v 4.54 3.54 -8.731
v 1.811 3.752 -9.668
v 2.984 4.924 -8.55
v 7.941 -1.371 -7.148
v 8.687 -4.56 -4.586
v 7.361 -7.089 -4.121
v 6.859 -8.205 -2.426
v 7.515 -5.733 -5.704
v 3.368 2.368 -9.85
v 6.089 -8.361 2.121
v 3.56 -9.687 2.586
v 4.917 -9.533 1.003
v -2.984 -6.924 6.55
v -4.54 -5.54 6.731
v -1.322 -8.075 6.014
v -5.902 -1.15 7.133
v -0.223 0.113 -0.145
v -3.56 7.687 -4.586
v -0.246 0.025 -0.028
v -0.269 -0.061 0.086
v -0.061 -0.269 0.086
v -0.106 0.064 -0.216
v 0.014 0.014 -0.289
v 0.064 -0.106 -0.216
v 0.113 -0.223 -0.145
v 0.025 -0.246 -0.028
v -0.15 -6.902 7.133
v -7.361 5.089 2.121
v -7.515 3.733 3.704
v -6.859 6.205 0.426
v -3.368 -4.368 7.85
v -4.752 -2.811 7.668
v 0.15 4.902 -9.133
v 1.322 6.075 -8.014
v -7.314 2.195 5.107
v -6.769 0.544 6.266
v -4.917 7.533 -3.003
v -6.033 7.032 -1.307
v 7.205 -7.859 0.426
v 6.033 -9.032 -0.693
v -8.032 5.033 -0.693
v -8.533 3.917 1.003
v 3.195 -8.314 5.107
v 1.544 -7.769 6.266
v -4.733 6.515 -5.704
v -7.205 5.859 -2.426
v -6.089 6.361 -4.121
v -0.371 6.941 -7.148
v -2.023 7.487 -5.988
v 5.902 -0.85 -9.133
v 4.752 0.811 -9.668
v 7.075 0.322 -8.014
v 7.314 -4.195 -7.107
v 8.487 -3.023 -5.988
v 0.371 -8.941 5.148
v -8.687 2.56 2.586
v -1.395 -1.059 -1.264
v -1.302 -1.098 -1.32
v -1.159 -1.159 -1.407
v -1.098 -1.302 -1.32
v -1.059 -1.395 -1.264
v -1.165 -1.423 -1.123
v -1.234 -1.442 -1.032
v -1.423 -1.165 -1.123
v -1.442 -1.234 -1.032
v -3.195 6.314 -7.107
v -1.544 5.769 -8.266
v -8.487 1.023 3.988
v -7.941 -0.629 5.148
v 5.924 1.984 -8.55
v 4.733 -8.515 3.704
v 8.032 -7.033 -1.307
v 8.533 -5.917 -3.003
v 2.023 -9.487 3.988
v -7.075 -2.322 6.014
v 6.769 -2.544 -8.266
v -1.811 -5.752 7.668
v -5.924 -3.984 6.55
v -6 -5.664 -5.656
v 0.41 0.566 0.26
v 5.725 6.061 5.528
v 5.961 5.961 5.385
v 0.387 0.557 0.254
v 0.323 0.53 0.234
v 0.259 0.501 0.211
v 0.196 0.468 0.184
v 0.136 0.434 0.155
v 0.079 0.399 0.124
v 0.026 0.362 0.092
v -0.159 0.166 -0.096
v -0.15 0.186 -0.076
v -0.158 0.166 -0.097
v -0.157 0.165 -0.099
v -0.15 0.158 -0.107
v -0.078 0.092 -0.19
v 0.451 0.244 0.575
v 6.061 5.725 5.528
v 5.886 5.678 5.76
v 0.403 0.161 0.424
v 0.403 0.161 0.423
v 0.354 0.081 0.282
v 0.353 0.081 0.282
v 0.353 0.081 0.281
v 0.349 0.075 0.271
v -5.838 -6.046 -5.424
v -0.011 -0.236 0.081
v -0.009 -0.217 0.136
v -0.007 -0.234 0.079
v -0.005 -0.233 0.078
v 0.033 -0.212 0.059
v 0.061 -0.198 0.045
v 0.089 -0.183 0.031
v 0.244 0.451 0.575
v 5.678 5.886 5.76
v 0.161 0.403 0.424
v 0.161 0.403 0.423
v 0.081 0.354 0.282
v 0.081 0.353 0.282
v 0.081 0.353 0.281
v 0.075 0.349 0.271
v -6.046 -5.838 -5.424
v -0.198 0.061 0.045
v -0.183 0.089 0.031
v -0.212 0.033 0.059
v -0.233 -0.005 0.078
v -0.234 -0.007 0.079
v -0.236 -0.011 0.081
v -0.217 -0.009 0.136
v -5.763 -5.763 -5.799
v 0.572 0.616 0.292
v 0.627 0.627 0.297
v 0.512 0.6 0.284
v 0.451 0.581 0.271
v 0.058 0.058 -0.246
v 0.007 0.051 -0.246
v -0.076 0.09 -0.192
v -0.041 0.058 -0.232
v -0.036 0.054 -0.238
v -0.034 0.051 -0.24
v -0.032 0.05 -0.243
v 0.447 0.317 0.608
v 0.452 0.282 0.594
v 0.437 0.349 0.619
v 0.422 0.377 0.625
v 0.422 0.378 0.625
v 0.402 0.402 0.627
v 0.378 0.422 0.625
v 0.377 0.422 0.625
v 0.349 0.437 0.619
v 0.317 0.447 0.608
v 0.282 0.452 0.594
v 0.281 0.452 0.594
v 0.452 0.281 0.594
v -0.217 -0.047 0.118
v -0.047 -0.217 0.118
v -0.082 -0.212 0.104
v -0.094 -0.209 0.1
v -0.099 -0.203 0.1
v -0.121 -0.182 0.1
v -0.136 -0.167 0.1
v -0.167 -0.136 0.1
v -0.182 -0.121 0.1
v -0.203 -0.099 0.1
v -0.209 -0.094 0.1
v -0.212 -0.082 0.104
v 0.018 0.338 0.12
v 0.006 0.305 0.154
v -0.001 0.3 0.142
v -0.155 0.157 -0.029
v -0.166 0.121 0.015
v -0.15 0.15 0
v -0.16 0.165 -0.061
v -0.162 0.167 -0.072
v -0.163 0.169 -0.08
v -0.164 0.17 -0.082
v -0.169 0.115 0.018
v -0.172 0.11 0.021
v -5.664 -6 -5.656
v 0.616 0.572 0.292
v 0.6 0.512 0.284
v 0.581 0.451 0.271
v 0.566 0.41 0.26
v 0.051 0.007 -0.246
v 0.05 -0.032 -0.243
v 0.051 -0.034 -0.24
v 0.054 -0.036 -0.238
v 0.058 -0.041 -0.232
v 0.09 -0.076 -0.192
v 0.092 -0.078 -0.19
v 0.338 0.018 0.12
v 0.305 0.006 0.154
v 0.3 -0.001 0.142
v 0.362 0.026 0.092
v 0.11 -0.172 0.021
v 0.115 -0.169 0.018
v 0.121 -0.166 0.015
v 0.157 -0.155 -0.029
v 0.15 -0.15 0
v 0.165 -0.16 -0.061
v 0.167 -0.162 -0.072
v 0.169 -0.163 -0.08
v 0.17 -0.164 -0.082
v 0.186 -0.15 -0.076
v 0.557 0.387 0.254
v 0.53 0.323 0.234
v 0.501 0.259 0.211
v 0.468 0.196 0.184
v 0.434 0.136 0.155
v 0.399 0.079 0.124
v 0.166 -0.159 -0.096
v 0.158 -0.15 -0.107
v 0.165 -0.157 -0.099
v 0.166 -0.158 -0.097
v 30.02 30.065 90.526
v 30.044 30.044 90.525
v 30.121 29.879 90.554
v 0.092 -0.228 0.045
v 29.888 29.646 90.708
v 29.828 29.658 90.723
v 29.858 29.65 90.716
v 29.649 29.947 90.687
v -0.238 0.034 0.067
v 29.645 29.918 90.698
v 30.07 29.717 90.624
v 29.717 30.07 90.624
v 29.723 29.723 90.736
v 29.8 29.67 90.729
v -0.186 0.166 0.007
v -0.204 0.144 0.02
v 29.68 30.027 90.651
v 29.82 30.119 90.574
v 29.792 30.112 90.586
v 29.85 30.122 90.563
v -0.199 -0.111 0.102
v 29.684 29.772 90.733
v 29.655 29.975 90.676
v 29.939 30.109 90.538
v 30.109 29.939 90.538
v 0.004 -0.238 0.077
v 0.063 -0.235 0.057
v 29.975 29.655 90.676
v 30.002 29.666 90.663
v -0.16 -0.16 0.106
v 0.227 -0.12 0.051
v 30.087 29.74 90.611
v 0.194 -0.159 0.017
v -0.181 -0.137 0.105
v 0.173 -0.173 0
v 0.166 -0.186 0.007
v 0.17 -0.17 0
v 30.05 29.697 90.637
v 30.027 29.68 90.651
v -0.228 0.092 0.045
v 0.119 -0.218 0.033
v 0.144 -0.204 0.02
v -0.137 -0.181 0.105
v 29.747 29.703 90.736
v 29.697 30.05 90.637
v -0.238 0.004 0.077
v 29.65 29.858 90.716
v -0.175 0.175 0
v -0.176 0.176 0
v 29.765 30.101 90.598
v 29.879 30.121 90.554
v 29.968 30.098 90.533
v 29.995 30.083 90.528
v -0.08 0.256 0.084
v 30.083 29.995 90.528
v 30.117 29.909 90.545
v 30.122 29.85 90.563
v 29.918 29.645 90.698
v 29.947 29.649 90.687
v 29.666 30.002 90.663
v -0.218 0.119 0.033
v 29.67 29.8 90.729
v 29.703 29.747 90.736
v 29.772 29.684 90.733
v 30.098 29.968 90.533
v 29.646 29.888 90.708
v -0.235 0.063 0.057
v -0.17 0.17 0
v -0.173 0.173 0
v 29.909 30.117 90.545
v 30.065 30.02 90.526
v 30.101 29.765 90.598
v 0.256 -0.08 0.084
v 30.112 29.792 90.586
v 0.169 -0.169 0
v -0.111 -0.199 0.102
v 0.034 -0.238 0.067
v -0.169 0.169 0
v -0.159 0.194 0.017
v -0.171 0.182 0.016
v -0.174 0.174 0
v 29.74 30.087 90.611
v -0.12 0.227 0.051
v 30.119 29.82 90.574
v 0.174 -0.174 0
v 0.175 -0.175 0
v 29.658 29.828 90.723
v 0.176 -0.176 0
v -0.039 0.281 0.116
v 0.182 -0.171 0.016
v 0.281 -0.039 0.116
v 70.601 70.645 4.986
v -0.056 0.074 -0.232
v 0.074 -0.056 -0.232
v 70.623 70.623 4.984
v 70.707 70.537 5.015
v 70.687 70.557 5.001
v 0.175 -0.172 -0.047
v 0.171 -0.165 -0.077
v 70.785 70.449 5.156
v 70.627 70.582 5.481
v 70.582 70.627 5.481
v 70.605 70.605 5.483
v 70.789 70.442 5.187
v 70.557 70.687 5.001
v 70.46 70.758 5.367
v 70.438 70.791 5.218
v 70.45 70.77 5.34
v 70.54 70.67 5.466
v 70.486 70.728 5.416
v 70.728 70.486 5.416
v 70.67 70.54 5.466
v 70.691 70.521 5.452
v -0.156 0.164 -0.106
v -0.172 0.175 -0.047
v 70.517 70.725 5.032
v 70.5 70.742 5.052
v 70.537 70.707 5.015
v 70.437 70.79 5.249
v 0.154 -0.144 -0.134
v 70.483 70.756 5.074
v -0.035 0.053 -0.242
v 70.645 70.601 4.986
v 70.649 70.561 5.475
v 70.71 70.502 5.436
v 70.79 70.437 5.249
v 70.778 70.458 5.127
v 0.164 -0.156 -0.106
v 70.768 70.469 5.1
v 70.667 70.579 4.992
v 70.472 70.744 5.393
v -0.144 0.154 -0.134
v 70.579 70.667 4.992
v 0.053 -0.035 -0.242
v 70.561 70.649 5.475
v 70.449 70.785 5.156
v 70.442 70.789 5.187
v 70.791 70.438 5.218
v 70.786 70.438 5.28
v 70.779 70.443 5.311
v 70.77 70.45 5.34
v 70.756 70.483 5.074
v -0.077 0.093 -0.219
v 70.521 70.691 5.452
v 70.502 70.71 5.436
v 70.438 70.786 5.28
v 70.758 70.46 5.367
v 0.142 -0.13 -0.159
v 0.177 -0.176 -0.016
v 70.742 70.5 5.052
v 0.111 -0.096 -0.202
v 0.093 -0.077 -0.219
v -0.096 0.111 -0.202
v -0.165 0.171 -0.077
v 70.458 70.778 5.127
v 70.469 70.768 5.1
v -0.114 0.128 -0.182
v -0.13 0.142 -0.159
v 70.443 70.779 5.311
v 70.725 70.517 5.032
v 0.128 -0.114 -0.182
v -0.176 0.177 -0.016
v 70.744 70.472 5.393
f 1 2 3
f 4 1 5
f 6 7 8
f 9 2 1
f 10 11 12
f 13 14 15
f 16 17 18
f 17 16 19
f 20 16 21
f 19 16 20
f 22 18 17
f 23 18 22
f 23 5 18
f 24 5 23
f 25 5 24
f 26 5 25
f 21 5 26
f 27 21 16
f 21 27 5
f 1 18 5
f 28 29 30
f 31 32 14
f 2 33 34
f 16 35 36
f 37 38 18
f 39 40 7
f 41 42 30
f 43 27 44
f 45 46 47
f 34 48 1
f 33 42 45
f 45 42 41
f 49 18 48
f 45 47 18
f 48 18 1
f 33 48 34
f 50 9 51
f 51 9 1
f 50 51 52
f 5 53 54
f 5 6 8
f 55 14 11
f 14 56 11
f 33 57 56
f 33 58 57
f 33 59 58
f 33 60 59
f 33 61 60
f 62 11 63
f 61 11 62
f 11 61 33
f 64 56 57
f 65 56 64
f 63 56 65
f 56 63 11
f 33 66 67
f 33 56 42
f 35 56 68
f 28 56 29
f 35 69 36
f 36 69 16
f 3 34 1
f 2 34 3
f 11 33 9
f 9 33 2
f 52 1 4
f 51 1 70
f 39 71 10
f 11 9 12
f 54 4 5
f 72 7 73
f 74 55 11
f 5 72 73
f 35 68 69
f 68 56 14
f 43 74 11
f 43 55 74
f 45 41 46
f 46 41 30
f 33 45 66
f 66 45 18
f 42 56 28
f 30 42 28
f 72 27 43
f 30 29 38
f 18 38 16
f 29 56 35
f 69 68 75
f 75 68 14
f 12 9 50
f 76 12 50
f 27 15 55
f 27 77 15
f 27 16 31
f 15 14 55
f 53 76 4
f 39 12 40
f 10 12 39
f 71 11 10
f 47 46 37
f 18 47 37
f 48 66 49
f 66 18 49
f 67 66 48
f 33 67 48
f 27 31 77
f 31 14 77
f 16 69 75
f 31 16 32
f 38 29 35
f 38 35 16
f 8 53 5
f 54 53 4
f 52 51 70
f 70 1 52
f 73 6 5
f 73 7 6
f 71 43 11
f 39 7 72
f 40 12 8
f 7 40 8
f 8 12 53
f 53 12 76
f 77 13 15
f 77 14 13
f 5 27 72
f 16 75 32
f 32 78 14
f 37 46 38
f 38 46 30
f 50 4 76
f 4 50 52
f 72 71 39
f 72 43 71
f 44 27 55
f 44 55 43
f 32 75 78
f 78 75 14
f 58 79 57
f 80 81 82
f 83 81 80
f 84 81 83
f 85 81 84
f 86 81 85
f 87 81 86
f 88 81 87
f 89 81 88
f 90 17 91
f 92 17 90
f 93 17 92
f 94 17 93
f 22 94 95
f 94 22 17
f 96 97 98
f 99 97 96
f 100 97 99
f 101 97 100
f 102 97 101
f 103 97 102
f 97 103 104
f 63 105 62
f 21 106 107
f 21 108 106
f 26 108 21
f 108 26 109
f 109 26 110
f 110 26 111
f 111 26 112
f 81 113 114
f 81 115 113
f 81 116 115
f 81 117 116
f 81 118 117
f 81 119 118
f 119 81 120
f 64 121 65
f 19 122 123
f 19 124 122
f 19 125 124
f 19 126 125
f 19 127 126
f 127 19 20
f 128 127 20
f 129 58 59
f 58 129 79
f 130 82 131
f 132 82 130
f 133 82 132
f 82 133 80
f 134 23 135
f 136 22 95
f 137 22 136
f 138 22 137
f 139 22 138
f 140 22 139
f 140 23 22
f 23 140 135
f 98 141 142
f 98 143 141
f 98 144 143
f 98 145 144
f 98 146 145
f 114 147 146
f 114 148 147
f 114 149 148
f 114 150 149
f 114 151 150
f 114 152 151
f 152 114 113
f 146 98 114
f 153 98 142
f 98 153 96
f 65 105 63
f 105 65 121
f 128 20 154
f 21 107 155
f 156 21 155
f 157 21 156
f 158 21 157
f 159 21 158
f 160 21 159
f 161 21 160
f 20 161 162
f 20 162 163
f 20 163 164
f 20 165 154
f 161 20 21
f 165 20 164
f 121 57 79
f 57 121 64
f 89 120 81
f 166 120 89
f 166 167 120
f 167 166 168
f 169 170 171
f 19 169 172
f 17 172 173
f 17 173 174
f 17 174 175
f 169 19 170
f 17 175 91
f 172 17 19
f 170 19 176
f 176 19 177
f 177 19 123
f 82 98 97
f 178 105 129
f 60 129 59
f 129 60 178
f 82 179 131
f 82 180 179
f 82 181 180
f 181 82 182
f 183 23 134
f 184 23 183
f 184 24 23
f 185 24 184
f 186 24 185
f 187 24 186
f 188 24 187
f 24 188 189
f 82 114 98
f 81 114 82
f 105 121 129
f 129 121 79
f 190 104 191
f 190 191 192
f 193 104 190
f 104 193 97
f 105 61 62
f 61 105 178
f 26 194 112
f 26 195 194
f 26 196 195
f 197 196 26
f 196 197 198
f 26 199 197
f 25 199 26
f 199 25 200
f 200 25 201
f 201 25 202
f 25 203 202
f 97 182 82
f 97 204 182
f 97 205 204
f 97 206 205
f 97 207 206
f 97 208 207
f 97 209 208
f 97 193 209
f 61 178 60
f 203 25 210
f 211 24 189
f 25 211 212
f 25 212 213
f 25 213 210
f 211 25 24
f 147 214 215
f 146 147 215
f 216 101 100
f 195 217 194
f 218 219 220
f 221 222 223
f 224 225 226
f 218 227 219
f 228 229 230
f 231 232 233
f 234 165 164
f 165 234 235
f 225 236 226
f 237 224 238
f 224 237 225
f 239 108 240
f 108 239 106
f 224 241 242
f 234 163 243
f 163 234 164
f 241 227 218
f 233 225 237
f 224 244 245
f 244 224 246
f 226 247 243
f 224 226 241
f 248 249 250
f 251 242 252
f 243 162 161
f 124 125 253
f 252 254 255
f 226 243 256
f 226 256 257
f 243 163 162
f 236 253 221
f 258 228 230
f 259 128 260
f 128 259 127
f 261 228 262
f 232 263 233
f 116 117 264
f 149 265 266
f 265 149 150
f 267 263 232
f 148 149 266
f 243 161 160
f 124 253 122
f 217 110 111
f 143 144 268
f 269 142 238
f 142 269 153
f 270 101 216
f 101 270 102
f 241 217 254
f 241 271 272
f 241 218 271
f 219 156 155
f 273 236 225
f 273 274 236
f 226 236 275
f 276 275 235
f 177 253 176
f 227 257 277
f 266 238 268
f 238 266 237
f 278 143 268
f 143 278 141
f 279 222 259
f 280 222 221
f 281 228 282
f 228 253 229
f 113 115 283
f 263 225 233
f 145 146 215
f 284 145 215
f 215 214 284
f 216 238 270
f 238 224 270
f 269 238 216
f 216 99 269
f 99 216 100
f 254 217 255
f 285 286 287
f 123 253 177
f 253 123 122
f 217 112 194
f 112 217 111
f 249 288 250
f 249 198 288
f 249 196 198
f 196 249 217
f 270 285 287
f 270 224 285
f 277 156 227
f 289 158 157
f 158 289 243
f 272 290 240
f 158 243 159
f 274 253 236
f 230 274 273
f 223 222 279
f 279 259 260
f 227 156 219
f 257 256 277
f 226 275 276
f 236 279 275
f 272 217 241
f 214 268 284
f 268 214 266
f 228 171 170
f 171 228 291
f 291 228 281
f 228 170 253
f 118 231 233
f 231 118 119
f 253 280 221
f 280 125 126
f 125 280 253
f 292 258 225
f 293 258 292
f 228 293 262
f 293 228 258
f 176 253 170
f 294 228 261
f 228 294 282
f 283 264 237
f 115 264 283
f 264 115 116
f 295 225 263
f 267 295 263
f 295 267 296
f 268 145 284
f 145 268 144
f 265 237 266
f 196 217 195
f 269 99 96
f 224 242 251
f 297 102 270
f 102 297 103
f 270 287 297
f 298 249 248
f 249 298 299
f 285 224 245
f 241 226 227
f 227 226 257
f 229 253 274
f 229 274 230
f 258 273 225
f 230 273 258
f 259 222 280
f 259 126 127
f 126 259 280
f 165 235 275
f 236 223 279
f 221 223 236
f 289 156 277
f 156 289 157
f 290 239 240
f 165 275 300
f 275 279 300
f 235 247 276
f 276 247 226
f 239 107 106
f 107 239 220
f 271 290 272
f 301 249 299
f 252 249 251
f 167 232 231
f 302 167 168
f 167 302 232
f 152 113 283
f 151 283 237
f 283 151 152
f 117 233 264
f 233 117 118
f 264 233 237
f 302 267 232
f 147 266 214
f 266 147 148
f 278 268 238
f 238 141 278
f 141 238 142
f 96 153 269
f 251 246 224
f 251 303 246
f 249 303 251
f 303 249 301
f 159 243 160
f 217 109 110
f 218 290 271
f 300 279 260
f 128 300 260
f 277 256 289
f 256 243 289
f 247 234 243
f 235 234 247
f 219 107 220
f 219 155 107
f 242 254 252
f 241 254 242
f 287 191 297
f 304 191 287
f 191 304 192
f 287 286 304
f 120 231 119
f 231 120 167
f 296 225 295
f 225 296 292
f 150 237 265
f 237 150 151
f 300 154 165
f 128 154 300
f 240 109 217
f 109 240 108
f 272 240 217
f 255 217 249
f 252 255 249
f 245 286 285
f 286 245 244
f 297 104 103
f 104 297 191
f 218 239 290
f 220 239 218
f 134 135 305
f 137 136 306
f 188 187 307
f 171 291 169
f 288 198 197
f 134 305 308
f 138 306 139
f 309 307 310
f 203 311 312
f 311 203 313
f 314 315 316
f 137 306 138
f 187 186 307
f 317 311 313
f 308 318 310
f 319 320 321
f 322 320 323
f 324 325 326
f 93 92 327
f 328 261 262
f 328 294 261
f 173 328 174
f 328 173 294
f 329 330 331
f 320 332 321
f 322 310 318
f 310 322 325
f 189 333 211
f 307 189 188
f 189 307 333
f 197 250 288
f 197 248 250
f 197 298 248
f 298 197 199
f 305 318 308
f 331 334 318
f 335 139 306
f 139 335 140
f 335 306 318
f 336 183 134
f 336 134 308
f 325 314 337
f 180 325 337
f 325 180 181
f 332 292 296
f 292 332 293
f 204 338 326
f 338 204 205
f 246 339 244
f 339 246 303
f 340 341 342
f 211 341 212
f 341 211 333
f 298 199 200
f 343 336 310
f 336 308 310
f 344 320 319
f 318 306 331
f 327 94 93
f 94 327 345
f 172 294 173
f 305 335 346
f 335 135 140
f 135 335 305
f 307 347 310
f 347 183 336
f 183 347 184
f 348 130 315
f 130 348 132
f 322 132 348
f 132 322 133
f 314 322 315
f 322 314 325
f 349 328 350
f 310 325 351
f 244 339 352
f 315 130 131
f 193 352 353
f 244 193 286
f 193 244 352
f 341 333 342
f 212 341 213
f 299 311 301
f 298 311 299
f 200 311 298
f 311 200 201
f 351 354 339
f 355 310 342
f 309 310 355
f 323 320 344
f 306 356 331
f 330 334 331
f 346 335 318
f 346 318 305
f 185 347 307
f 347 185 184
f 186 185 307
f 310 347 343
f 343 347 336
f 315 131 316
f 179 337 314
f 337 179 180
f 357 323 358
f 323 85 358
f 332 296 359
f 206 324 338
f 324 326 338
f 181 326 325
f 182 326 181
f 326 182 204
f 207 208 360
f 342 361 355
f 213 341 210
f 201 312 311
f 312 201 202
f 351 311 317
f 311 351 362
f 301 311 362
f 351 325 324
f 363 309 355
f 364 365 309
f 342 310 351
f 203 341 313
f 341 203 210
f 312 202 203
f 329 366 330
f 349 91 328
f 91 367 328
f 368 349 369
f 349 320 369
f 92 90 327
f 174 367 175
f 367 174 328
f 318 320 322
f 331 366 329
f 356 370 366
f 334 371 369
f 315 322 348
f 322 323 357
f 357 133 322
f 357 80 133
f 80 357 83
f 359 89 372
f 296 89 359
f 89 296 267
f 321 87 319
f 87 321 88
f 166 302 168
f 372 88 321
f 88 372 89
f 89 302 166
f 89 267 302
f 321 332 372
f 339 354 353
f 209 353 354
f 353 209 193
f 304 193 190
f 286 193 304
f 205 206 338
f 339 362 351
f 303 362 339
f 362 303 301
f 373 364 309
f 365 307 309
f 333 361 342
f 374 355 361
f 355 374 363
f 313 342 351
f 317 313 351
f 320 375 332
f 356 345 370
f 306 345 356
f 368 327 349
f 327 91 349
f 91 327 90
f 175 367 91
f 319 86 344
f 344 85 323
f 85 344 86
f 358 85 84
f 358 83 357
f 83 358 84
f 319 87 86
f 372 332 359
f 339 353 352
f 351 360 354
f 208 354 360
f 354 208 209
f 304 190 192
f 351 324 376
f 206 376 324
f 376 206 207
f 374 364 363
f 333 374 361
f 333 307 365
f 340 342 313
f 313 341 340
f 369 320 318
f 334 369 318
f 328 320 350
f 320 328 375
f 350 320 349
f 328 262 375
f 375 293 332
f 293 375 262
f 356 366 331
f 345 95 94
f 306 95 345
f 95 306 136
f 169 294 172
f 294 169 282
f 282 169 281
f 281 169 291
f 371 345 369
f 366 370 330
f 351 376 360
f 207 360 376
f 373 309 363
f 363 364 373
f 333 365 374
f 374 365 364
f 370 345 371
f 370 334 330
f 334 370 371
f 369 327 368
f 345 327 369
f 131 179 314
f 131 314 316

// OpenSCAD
x = 0;
y = 56;
z = 45;
ira = 25;

aoi = y - ira;
rra = y + aoi;

module mirror(){
	translate ([0,-1,-1])rotate([x,y,z]) cylinder(r=10,h=2,center=true);
	rotate([x,y,z]) cylinder(r=.25,h=20,center=true);
}

module incidenceRay(){
	rotate([x,ira,z]) color([0,1,0]) cylinder(r=.25,h=100,$fn=50);
}

module reflectedRay(){
	rotate([x,rra,z]) color([1,1,0]) cylinder(r=.25,h=100,$fn=50);
}

module group(){
	mirror();
	incidenceRay();
	reflectedRay();
}

group();
//function saw(t) = 1 - 2*abs(t-0.5);    
//rotate([0,0,saw($t)*360,0])  group();
